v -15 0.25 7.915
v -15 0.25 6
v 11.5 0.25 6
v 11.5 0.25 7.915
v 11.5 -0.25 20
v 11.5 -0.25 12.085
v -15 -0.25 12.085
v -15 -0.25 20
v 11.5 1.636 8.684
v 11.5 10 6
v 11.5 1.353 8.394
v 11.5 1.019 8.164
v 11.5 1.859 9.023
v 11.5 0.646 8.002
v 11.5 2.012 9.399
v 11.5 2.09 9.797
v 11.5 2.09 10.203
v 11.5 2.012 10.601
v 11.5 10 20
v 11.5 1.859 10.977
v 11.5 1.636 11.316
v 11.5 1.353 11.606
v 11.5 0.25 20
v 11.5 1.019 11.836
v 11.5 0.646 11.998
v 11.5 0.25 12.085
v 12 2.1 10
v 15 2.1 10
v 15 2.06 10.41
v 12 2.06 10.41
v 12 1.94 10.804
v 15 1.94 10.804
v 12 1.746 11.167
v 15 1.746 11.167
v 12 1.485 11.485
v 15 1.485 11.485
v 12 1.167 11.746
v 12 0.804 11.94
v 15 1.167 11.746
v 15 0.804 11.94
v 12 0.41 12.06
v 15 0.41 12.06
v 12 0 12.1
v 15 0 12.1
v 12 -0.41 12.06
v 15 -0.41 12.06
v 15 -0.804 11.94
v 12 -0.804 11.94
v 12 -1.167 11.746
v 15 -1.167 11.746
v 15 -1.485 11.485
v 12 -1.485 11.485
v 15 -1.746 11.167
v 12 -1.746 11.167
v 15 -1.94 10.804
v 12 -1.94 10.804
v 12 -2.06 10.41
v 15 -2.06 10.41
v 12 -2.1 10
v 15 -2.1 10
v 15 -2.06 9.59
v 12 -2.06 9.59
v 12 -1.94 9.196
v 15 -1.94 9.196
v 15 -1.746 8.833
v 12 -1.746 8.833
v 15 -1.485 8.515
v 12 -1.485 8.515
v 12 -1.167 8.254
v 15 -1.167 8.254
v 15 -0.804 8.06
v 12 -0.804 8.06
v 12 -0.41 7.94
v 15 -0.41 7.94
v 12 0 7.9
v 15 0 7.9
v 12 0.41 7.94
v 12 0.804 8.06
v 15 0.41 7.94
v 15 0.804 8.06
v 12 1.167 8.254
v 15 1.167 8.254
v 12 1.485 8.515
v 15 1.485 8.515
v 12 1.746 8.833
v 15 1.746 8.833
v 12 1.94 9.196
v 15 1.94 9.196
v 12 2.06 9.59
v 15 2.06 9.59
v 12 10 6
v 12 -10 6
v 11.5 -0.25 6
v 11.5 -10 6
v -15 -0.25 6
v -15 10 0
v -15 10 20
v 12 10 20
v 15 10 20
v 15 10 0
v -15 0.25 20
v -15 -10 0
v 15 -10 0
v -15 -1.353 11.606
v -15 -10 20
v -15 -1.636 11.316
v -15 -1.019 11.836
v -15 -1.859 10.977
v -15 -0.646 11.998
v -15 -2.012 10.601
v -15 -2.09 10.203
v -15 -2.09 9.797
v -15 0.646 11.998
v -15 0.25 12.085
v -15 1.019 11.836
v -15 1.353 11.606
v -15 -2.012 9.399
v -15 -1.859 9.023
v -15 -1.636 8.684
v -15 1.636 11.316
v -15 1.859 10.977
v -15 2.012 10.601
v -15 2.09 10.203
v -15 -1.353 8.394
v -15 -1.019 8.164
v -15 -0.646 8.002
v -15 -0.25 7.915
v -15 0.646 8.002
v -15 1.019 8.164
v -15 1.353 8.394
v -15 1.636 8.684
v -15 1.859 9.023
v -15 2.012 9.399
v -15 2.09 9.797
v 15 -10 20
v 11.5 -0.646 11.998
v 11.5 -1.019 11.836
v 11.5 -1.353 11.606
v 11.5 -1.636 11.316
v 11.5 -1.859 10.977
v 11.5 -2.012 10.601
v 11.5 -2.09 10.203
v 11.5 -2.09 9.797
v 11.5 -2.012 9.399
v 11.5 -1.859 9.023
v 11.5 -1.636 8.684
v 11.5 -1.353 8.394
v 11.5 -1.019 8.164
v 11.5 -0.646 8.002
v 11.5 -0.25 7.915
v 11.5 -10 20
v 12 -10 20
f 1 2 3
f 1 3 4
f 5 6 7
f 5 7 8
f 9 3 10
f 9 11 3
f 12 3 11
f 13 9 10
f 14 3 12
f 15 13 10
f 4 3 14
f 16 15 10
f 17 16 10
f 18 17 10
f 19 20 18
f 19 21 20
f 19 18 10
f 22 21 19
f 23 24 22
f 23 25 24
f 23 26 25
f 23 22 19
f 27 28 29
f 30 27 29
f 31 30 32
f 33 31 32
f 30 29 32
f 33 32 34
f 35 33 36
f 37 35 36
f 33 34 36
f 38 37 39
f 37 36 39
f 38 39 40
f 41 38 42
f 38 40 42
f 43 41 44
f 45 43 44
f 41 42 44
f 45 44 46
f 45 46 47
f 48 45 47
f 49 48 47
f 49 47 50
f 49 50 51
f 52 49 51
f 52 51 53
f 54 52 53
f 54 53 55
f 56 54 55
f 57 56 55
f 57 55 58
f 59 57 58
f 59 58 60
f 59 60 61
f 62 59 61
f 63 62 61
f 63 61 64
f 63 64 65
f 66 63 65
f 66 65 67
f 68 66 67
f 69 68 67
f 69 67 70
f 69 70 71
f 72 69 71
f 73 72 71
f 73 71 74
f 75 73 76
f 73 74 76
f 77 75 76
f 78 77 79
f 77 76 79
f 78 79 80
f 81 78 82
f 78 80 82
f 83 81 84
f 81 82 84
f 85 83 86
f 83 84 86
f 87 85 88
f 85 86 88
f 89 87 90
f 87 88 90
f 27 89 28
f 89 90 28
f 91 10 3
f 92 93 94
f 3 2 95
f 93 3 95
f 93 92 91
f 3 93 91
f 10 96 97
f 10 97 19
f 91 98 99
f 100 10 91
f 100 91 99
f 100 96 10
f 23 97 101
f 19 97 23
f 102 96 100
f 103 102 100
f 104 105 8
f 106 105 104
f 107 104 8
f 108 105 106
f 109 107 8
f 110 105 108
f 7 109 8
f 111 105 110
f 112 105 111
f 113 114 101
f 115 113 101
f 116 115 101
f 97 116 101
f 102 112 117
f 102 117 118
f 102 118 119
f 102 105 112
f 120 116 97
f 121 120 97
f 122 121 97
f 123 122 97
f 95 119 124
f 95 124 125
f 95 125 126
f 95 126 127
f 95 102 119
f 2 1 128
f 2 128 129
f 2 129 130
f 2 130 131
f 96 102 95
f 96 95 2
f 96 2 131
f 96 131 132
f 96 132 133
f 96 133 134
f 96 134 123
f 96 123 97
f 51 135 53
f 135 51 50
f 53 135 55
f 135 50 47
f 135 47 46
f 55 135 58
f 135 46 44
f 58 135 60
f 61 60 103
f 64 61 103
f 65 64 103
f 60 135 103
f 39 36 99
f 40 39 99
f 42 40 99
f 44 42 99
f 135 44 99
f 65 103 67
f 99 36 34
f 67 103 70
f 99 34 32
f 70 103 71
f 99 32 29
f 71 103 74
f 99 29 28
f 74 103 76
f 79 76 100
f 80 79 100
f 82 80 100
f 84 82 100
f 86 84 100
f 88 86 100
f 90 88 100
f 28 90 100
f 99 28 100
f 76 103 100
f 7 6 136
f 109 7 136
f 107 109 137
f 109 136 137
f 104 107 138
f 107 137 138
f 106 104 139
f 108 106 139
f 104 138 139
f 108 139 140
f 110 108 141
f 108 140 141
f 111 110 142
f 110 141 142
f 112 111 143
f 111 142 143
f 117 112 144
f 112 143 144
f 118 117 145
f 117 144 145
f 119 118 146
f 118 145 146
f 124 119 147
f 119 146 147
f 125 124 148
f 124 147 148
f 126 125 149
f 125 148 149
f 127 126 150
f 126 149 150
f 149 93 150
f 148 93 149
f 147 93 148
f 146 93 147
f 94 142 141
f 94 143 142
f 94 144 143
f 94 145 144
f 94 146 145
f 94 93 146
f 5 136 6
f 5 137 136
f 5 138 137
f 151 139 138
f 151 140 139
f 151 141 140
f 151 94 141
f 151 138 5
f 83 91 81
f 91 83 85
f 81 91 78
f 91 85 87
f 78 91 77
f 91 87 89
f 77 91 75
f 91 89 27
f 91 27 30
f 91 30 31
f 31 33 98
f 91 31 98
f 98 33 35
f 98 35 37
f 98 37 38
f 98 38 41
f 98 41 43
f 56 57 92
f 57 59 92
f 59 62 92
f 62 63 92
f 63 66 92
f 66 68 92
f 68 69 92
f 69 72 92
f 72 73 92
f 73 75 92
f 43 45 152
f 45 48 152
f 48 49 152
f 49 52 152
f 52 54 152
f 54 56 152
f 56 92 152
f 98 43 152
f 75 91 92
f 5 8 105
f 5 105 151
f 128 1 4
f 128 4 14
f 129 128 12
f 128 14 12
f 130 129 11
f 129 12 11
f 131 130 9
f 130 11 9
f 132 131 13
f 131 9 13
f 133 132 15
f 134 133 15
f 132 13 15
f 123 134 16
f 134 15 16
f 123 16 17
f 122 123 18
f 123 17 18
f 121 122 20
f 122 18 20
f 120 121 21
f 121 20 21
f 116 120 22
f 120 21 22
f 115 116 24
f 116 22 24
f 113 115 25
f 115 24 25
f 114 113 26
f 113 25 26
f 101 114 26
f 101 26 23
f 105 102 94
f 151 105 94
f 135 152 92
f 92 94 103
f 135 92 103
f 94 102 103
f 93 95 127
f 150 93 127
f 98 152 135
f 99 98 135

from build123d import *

# Parameters (mm, degrees)
SKETCH_W        = 30
SKETCH_H        = 20
PAD_DEPTH       = 20
SKETCH001_W     = 0.5
SKETCH001_H     = 14
POCKET_DEPTH    = 20.001
SKETCH002_R     = 2.1
POCKET001_DEPTH = 30.001
SKETCH003_W     = 0.5
SKETCH003_H     = 14
POCKET002_DEPTH = 26.5


with BuildPart() as part:
    # Sketch → Pad (new body)
    with BuildSketch(Plane.XY):
        Rectangle(SKETCH_W, SKETCH_H)
    extrude(amount=PAD_DEPTH)

    # Sketch001 (on Face2 of Pad) → Pocket (cut, through all)
    with BuildSketch(Plane.XZ.offset(10)):
        with Locations((11.75, 13)):
            Rectangle(SKETCH001_W, SKETCH001_H)
    extrude(amount=-POCKET_DEPTH, mode=Mode.SUBTRACT)

    # Sketch002 (on Face10 of Pocket) → Pocket001 (cut, through all)
    with BuildSketch(Plane.YZ.offset(15)):
        with Locations((0, 10)):
            Circle(SKETCH002_R)
    extrude(amount=-POCKET001_DEPTH, mode=Mode.SUBTRACT)

    # Sketch003 (on Face1 of Pocket001) → Pocket002 (cut)
    with BuildSketch(Plane(origin=(-15, 0, 0), x_dir=(0, -1, 0), z_dir=(-1, 0, 0))):
        with Locations((0, 13)):
            Rectangle(SKETCH003_W, SKETCH003_H)
    extrude(amount=-POCKET002_DEPTH, mode=Mode.SUBTRACT)


solid = part.part
